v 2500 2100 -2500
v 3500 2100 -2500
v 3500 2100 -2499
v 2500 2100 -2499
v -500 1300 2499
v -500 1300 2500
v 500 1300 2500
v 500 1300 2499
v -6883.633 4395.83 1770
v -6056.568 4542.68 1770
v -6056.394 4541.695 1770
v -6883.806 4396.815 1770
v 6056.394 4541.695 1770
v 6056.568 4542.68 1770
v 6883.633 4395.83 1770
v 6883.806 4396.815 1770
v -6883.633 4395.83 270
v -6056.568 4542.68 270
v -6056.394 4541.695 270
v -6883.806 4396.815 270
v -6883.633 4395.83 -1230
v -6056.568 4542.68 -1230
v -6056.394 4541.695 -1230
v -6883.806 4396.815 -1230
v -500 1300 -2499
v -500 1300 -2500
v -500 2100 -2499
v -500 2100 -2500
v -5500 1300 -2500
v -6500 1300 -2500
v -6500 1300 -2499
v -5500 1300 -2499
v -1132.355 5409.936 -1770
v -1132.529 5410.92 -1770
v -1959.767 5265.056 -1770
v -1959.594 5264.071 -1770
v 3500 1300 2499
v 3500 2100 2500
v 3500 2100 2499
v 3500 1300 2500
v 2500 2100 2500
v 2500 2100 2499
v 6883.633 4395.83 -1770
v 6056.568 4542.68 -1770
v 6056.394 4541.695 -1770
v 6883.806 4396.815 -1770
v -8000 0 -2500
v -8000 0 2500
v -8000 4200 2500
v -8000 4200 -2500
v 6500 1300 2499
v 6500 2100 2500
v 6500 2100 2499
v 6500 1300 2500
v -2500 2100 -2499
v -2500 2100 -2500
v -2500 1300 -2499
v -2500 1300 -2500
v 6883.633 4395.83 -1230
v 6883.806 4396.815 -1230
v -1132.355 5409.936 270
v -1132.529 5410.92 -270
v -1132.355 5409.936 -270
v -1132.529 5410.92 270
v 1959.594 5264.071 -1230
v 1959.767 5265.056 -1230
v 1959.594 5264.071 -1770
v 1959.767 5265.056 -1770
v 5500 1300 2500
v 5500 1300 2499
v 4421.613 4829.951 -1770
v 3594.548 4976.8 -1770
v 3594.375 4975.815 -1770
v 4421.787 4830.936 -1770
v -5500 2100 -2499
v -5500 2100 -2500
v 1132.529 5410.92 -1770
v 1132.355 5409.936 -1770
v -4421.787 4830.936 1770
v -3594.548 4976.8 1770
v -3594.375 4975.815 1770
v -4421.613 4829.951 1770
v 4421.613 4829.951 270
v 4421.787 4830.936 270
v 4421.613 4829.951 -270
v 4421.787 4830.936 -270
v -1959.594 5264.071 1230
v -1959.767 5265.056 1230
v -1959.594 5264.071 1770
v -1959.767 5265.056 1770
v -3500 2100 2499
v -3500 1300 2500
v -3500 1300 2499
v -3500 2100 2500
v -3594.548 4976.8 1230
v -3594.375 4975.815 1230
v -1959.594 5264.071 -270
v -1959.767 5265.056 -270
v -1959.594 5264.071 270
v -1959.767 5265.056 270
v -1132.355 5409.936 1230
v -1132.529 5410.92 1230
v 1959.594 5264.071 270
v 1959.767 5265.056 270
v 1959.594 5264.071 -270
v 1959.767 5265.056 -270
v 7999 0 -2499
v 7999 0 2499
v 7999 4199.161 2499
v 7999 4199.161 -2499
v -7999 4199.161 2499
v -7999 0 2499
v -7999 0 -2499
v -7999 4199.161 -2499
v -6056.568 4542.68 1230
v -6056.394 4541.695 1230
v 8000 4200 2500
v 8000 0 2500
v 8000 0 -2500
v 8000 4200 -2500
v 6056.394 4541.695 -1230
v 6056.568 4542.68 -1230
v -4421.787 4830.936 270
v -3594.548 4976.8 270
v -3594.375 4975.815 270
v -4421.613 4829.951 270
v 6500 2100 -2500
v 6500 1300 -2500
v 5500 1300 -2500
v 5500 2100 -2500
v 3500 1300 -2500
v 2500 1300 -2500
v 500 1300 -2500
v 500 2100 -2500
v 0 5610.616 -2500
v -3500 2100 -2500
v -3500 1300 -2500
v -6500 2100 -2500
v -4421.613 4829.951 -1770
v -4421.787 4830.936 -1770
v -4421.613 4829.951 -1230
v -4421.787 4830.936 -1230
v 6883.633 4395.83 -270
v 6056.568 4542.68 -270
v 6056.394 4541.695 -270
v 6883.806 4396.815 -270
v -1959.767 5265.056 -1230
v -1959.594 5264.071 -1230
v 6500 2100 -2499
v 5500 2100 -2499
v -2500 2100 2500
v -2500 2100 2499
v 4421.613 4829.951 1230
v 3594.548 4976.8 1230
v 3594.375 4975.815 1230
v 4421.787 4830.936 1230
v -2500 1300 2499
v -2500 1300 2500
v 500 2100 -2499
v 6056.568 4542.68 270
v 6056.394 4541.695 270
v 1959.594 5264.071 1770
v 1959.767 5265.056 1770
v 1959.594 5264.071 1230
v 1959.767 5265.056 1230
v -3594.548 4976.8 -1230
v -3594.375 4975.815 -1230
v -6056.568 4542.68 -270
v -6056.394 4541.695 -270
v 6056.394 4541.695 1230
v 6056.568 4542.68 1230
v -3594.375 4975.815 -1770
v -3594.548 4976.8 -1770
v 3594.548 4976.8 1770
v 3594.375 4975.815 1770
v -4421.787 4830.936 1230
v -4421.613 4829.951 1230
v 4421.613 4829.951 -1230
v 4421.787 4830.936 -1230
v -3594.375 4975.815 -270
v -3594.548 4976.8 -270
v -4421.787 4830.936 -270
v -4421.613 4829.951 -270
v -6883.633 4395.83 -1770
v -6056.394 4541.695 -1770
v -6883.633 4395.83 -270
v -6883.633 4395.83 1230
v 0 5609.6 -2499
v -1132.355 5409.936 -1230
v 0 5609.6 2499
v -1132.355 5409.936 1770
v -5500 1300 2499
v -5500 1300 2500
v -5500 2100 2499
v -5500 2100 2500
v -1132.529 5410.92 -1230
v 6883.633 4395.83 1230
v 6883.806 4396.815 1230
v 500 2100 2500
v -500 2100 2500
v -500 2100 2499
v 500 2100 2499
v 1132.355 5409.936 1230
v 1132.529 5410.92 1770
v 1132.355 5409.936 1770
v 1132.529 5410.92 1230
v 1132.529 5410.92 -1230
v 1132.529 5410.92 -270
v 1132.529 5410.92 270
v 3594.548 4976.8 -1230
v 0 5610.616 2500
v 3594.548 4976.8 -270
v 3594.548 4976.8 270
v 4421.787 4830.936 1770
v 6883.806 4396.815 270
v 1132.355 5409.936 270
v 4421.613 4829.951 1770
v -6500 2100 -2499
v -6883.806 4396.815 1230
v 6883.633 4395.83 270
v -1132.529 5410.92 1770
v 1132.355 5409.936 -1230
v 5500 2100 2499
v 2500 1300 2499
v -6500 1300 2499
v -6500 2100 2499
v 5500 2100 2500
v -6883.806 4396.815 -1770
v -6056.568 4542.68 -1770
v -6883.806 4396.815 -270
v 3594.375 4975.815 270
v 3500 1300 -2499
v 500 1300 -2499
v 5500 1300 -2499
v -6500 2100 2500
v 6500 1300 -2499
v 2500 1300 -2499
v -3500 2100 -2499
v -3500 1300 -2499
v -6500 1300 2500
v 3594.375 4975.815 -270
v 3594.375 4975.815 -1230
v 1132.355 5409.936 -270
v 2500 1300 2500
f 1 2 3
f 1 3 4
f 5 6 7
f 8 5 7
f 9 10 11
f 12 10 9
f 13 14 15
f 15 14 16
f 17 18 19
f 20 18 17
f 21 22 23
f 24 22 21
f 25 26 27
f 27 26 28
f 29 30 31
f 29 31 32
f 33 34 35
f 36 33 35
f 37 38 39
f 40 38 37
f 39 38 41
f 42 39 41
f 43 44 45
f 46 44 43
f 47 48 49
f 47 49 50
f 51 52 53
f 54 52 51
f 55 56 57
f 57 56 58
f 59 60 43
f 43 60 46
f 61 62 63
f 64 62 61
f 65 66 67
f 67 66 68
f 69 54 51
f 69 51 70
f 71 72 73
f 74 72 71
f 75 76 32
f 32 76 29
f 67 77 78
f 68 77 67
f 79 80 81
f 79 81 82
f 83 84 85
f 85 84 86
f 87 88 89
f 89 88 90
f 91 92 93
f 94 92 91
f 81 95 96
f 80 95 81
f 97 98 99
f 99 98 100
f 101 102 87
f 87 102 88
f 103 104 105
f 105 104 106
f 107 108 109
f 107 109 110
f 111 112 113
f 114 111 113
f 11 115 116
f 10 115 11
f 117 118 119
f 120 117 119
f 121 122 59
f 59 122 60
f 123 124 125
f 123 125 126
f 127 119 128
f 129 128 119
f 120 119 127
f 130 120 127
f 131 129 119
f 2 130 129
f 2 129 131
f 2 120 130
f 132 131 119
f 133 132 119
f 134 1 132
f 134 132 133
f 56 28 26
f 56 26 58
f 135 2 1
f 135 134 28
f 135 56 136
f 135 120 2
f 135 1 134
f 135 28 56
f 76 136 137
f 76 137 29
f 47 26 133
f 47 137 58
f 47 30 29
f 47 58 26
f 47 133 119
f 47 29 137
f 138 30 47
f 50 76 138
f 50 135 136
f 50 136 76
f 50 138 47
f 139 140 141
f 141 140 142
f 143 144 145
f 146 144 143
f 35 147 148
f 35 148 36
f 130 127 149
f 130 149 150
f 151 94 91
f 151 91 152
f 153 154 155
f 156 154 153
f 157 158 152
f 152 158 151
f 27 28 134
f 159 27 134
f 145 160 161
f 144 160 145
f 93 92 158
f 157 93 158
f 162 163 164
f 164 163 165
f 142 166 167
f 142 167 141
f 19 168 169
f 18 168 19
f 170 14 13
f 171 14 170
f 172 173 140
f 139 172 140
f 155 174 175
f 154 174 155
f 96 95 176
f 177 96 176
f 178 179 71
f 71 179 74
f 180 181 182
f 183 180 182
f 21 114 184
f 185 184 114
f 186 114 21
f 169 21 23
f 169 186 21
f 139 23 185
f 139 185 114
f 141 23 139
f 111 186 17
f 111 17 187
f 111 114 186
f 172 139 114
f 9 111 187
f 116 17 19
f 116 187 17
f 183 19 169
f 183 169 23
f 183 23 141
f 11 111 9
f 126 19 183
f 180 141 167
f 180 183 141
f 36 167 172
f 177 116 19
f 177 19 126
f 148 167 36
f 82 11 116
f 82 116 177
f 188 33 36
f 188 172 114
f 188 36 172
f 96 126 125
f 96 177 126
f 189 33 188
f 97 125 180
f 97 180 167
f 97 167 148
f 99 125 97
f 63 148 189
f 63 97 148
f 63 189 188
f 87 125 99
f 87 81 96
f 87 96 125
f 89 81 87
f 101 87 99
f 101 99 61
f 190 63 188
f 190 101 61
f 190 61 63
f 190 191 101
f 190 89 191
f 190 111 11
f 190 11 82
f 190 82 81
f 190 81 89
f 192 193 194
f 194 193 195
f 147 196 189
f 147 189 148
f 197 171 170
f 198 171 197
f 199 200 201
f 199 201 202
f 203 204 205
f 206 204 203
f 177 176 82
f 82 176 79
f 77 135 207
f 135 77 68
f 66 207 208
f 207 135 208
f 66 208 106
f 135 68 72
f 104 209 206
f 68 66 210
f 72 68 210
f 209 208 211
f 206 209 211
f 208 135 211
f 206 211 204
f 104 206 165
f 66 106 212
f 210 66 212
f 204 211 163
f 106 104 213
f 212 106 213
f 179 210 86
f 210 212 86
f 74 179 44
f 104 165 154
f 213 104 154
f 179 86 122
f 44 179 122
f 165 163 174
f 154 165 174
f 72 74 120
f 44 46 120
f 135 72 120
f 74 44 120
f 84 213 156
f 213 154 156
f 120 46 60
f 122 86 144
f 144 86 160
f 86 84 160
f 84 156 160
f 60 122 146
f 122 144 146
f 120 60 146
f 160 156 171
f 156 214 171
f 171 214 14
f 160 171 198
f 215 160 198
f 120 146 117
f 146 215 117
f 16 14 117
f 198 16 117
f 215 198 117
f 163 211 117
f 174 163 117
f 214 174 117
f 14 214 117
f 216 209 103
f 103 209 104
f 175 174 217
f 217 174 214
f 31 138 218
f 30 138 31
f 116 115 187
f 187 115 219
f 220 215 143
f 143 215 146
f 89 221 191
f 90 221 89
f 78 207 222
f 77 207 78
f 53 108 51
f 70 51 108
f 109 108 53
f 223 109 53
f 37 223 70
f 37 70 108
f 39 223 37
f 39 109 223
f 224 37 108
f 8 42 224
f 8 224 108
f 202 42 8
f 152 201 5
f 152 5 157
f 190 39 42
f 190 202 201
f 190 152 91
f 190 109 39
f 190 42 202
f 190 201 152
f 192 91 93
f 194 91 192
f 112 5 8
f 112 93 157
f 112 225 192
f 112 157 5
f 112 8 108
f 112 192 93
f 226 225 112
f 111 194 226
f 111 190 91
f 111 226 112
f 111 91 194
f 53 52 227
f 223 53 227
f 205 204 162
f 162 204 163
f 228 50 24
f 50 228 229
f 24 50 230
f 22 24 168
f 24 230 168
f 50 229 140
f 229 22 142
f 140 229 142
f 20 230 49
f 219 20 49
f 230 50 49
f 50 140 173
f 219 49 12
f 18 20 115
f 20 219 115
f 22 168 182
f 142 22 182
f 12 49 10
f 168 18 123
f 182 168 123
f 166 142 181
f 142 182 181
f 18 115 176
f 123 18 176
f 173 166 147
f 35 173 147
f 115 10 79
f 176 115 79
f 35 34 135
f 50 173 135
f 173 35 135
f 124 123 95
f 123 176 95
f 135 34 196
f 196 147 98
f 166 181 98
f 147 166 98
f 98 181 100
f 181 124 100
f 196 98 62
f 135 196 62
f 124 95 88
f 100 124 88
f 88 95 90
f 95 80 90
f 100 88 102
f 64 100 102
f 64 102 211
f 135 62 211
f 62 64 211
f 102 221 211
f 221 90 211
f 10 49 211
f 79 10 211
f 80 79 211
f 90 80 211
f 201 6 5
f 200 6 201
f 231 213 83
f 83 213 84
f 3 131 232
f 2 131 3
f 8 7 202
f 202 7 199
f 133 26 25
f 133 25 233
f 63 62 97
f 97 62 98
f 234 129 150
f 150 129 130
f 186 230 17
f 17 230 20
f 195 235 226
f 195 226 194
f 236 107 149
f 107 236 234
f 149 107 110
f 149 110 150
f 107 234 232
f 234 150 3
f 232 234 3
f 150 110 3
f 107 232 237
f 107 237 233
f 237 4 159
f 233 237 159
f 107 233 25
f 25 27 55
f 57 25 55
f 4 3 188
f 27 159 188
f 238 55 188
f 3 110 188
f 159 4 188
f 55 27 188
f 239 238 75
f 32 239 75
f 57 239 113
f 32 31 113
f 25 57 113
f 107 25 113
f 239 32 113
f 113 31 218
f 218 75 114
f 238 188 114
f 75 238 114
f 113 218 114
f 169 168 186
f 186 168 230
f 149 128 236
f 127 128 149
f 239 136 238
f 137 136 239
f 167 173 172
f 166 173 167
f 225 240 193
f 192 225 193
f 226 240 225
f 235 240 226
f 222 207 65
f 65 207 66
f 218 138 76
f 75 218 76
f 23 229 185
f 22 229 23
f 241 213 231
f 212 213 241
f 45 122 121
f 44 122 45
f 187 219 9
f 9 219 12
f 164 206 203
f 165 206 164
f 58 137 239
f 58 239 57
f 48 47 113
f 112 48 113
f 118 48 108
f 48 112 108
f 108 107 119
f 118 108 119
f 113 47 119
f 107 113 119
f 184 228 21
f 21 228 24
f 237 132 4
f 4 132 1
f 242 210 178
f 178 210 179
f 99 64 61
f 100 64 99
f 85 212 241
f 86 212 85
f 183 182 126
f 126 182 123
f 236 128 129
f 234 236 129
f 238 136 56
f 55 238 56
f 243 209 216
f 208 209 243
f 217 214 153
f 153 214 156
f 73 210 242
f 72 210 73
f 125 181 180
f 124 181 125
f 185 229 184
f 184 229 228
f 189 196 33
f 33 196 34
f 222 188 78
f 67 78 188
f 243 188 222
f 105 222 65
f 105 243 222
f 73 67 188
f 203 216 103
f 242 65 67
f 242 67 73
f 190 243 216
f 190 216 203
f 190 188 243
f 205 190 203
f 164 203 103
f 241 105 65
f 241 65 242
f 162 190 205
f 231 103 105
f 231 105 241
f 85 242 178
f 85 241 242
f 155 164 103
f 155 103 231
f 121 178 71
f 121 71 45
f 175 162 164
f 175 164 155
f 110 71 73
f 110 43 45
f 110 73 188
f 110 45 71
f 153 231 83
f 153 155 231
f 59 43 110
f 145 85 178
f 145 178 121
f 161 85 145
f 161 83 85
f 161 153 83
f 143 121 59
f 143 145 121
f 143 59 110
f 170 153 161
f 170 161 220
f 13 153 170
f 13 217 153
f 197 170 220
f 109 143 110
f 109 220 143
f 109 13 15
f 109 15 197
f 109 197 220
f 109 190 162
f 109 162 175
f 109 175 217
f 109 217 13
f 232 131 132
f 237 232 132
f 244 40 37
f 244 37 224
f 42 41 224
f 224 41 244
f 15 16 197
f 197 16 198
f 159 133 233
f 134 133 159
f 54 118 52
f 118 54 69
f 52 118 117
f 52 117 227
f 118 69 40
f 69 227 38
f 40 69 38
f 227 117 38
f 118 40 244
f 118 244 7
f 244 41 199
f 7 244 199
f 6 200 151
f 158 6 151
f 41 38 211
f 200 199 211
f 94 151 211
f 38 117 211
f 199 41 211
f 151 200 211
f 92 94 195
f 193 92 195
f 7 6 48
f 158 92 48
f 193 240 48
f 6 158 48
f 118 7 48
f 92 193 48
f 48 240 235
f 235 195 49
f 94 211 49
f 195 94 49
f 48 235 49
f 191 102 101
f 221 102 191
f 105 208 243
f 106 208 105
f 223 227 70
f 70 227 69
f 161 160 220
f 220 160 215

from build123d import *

# Parameters (mm, degrees)
SKETCH2_W               = 16000
SKETCH2_H               = 5000
BOSS_EXTRUDE1_DEPTH     = 4200
BOSS_EXTRUDE2_DEPTH     = 2500
SHELL1_T                = -1
CUT_EXTRUDE1_REACH      = 10978.293
SKETCH4_W               = 1000
SKETCH4_H               = 800
LPATTERN1_COUNT         = 3
LPATTERN1_PITCH         = 3000
MIRROR1_COPY_1_REACH    = 10978.293
MIRROR1_COPY_1_SKETCH_W = 1000
MIRROR1_COPY_1_SKETCH_H = 800
MIRROR1_COPY_2_REACH    = 10978.293
MIRROR1_COPY_2_SKETCH_W = 1000
MIRROR1_COPY_2_SKETCH_H = 800
MIRROR4_COPY_1_REACH    = 10978.293
MIRROR4_COPY_1_SKETCH_W = 1000
MIRROR4_COPY_1_SKETCH_H = 800
MIRROR4_COPY_2_REACH    = 10978.293
MIRROR4_COPY_2_SKETCH_W = 1000
MIRROR4_COPY_2_SKETCH_H = 800
MIRROR4_COPY_3_REACH    = 10978.293
MIRROR4_COPY_3_SKETCH_W = 1000
MIRROR4_COPY_3_SKETCH_H = 800
MIRROR4_COPY_4_REACH    = 10978.293
MIRROR4_COPY_4_SKETCH_W = 1000
MIRROR4_COPY_4_SKETCH_H = 800
SKETCH5_W               = 840
SKETCH5_H               = 540
CUT_EXTRUDE2_DEPTH      = 1
LPATTERN2_COUNT         = 3
LPATTERN2_PITCH         = 1500
LPATTERN2_COUNT_DIR2    = 3
LPATTERN2_PITCH_DIR2    = 2500
MIRROR9_COPY_1_SKETCH_W = 840
MIRROR9_COPY_1_SKETCH_H = 540
MIRROR9_COPY_1_DEPTH    = 1
MIRROR9_COPY_2_SKETCH_W = 840
MIRROR9_COPY_2_SKETCH_H = 540
MIRROR9_COPY_2_DEPTH    = 1
MIRROR9_COPY_3_SKETCH_W = 840
MIRROR9_COPY_3_SKETCH_H = 540
MIRROR9_COPY_3_DEPTH    = 1
MIRROR9_COPY_4_SKETCH_W = 840
MIRROR9_COPY_4_SKETCH_H = 540
MIRROR9_COPY_4_DEPTH    = 1
MIRROR9_COPY_5_SKETCH_W = 840
MIRROR9_COPY_5_SKETCH_H = 540
MIRROR9_COPY_5_DEPTH    = 1
MIRROR9_COPY_6_SKETCH_W = 840
MIRROR9_COPY_6_SKETCH_H = 540
MIRROR9_COPY_6_DEPTH    = 1
MIRROR9_COPY_7_SKETCH_W = 840
MIRROR9_COPY_7_SKETCH_H = 540
MIRROR9_COPY_7_DEPTH    = 1
MIRROR9_COPY_8_SKETCH_W = 840
MIRROR9_COPY_8_SKETCH_H = 540
MIRROR9_COPY_8_DEPTH    = 1


with BuildPart() as part:
    # Sketch2 → Boss-Extrude1 (new body)
    with BuildSketch(Plane(origin=(0, 0, 0), x_dir=(1, 0, 0), z_dir=(0, 1, 0))):
        Rectangle(SKETCH2_W, SKETCH2_H)
    extrude(amount=BOSS_EXTRUDE1_DEPTH)

    # Sketch3 → Boss-Extrude2 (add, symmetric)
    with BuildSketch(Plane.XY):
        Polygon((-8000, 4200), (0, 5610.615845668), (8000, 4200), align=None)
    extrude(amount=BOSS_EXTRUDE2_DEPTH, both=True)

    # Shell1
    shell1_openings = [part.faces().sort_by_distance(p)[0] for p in [
        (0, 0, 0),
    ]]
    offset(amount=SHELL1_T, openings=shell1_openings, kind=Kind.INTERSECTION)

    # Sketch4 → Cut-Extrude1 (cut, up to next)
    with BuildSketch(Plane.XY.offset(2500), mode=Mode.PRIVATE) as cut_extrude1_sk1:
        with Locations((0, 1700)):
            Rectangle(SKETCH4_W, SKETCH4_H)
    cut_extrude1_tool1 = extrude(cut_extrude1_sk1.sketch, amount=-CUT_EXTRUDE1_REACH, mode=Mode.PRIVATE) & part.part
    cut_extrude1 = cut_extrude1_tool1.solids().sort_by_distance((0, 1700, 2500))[0]
    add(cut_extrude1, mode=Mode.SUBTRACT)

    # LPattern1: Cut-Extrude1 ×3
    with Locations(*[(-i * LPATTERN1_PITCH, 0, 0) for i in range(1, LPATTERN1_COUNT)]):
        add(cut_extrude1, mode=Mode.SUBTRACT)

    # Mirror1 copy 1 sketch → Mirror1 copy 1 (cut, up to next)
    with BuildSketch(Plane(origin=(3000, 0, 2500), x_dir=(-1, 0, 0), z_dir=(0, 0, 1)), mode=Mode.PRIVATE) as mirror1_copy_1_sk1:
        with Locations((0, -1700)):
            Rectangle(MIRROR1_COPY_1_SKETCH_W, MIRROR1_COPY_1_SKETCH_H)
    mirror1_copy_1_tool1 = extrude(mirror1_copy_1_sk1.sketch, amount=-MIRROR1_COPY_1_REACH, mode=Mode.PRIVATE) & part.part
    add(mirror1_copy_1_tool1.solids().sort_by_distance((3000, 1700, 2500))[0], mode=Mode.SUBTRACT)

    # Mirror1 copy 2 sketch → Mirror1 copy 2 (cut, up to next)
    with BuildSketch(Plane(origin=(6000, 0, 2500), x_dir=(-1, 0, 0), z_dir=(0, 0, 1)), mode=Mode.PRIVATE) as mirror1_copy_2_sk1:
        with Locations((0, -1700)):
            Rectangle(MIRROR1_COPY_2_SKETCH_W, MIRROR1_COPY_2_SKETCH_H)
    mirror1_copy_2_tool1 = extrude(mirror1_copy_2_sk1.sketch, amount=-MIRROR1_COPY_2_REACH, mode=Mode.PRIVATE) & part.part
    add(mirror1_copy_2_tool1.solids().sort_by_distance((6000, 1700, 2500))[0], mode=Mode.SUBTRACT)

    # Mirror4: Cut-Extrude1 across plane
    add(cut_extrude1.mirror(Plane.XY), mode=Mode.SUBTRACT)

    # Mirror4 copy 1 sketch → Mirror4 copy 1 (cut, up to next)
    with BuildSketch(Plane(origin=(-3000, 0, -2500), x_dir=(1, 0, 0), z_dir=(0, 0, -1)), mode=Mode.PRIVATE) as mirror4_copy_1_sk1:
        with Locations((0, -1700)):
            Rectangle(MIRROR4_COPY_1_SKETCH_W, MIRROR4_COPY_1_SKETCH_H)
    mirror4_copy_1_tool1 = extrude(mirror4_copy_1_sk1.sketch, amount=-MIRROR4_COPY_1_REACH, mode=Mode.PRIVATE) & part.part
    add(mirror4_copy_1_tool1.solids().sort_by_distance((-3000, 1700, -2500))[0], mode=Mode.SUBTRACT)

    # Mirror4 copy 2 sketch → Mirror4 copy 2 (cut, up to next)
    with BuildSketch(Plane(origin=(-6000, 0, -2500), x_dir=(1, 0, 0), z_dir=(0, 0, -1)), mode=Mode.PRIVATE) as mirror4_copy_2_sk1:
        with Locations((0, -1700)):
            Rectangle(MIRROR4_COPY_2_SKETCH_W, MIRROR4_COPY_2_SKETCH_H)
    mirror4_copy_2_tool1 = extrude(mirror4_copy_2_sk1.sketch, amount=-MIRROR4_COPY_2_REACH, mode=Mode.PRIVATE) & part.part
    add(mirror4_copy_2_tool1.solids().sort_by_distance((-6000, 1700, -2500))[0], mode=Mode.SUBTRACT)

    # Mirror4 copy 3 sketch → Mirror4 copy 3 (cut, up to next)
    with BuildSketch(Plane(origin=(3000, 0, -2500), x_dir=(-1, 0, 0), z_dir=(0, 0, -1)), mode=Mode.PRIVATE) as mirror4_copy_3_sk1:
        with Locations((0, 1700)):
            Rectangle(MIRROR4_COPY_3_SKETCH_W, MIRROR4_COPY_3_SKETCH_H)
    mirror4_copy_3_tool1 = extrude(mirror4_copy_3_sk1.sketch, amount=-MIRROR4_COPY_3_REACH, mode=Mode.PRIVATE) & part.part
    add(mirror4_copy_3_tool1.solids().sort_by_distance((3000, 1700, -2500))[0], mode=Mode.SUBTRACT)

    # Mirror4 copy 4 sketch → Mirror4 copy 4 (cut, up to next)
    with BuildSketch(Plane(origin=(6000, 0, -2500), x_dir=(-1, 0, 0), z_dir=(0, 0, -1)), mode=Mode.PRIVATE) as mirror4_copy_4_sk1:
        with Locations((0, 1700)):
            Rectangle(MIRROR4_COPY_4_SKETCH_W, MIRROR4_COPY_4_SKETCH_H)
    mirror4_copy_4_tool1 = extrude(mirror4_copy_4_sk1.sketch, amount=-MIRROR4_COPY_4_REACH, mode=Mode.PRIVATE) & part.part
    add(mirror4_copy_4_tool1.solids().sort_by_distance((6000, 1700, -2500))[0], mode=Mode.SUBTRACT)

    # Sketch5 → Cut-Extrude2 (cut)
    with BuildSketch(Plane(origin=(959.47181784, 5441.435076953, 0), x_dir=(0.9848077530122079, -0.17364817766693114, 0), z_dir=(0.17364817766693114, 0.9848077530122079, 0))):
        with Locations((595.726782811, 1500)):
            Rectangle(SKETCH5_W, SKETCH5_H)
    cut_extrude2 = extrude(amount=-CUT_EXTRUDE2_DEPTH, mode=Mode.SUBTRACT)

    # LPattern2: Cut-Extrude2 3 × 3
    with Locations(*[Vector(0, 0, 1) * (i * LPATTERN2_PITCH) + Vector(0.9848077530122079, -0.17364817766693114, 0) * (j * LPATTERN2_PITCH_DIR2) for i in range(LPATTERN2_COUNT) for j in range(LPATTERN2_COUNT_DIR2) if (i, j) != (0, 0)]):
        add(cut_extrude2, mode=Mode.SUBTRACT)

    # Mirror9: Cut-Extrude2 across plane
    add(cut_extrude2.mirror(Plane(origin=(0, 0, 0), x_dir=(0, 0, 1), z_dir=(1, 0, 0))), mode=Mode.SUBTRACT)

    # Mirror9 copy 1 sketch → Mirror9 copy 1 (cut)
    with BuildSketch(Plane(origin=(-3421.491200371, 5007.314632786, 0), x_dir=(-0.9848077530122079, -0.17364817766693114, 0), z_dir=(-0.17364817766693114, 0.9848077530122079, 0))):
        with Locations((595.726782811, -1500)):
            Rectangle(MIRROR9_COPY_1_SKETCH_W, MIRROR9_COPY_1_SKETCH_H)
    extrude(amount=-MIRROR9_COPY_1_DEPTH, mode=Mode.SUBTRACT)

    # Mirror9 copy 2 sketch → Mirror9 copy 2 (cut)
    with BuildSketch(Plane(origin=(-5883.510582901, 4573.194188618, 0), x_dir=(-0.9848077530122079, -0.17364817766693114, 0), z_dir=(-0.17364817766693114, 0.9848077530122079, 0))):
        with Locations((595.726782811, -1500)):
            Rectangle(MIRROR9_COPY_2_SKETCH_W, MIRROR9_COPY_2_SKETCH_H)
    extrude(amount=-MIRROR9_COPY_2_DEPTH, mode=Mode.SUBTRACT)

    # Mirror9 copy 3 sketch → Mirror9 copy 3 (cut)
    with BuildSketch(Plane(origin=(-959.47181784, 5441.435076953, 1500), x_dir=(-0.9848077530122079, -0.17364817766693114, 0), z_dir=(-0.17364817766693114, 0.9848077530122079, 0))):
        with Locations((595.726782811, -1500)):
            Rectangle(MIRROR9_COPY_3_SKETCH_W, MIRROR9_COPY_3_SKETCH_H)
    extrude(amount=-MIRROR9_COPY_3_DEPTH, mode=Mode.SUBTRACT)

    # Mirror9 copy 4 sketch → Mirror9 copy 4 (cut)
    with BuildSketch(Plane(origin=(-3421.491200371, 5007.314632786, 1500), x_dir=(-0.9848077530122079, -0.17364817766693114, 0), z_dir=(-0.17364817766693114, 0.9848077530122079, 0))):
        with Locations((595.726782811, -1500)):
            Rectangle(MIRROR9_COPY_4_SKETCH_W, MIRROR9_COPY_4_SKETCH_H)
    extrude(amount=-MIRROR9_COPY_4_DEPTH, mode=Mode.SUBTRACT)

    # Mirror9 copy 5 sketch → Mirror9 copy 5 (cut)
    with BuildSketch(Plane(origin=(-5883.510582901, 4573.194188618, 1500), x_dir=(-0.9848077530122079, -0.17364817766693114, 0), z_dir=(-0.17364817766693114, 0.9848077530122079, 0))):
        with Locations((595.726782811, -1500)):
            Rectangle(MIRROR9_COPY_5_SKETCH_W, MIRROR9_COPY_5_SKETCH_H)
    extrude(amount=-MIRROR9_COPY_5_DEPTH, mode=Mode.SUBTRACT)

    # Mirror9 copy 6 sketch → Mirror9 copy 6 (cut)
    with BuildSketch(Plane(origin=(-959.47181784, 5441.435076953, 3000), x_dir=(-0.9848077530122079, -0.17364817766693114, 0), z_dir=(-0.17364817766693114, 0.9848077530122079, 0))):
        with Locations((595.726782811, -1500)):
            Rectangle(MIRROR9_COPY_6_SKETCH_W, MIRROR9_COPY_6_SKETCH_H)
    extrude(amount=-MIRROR9_COPY_6_DEPTH, mode=Mode.SUBTRACT)

    # Mirror9 copy 7 sketch → Mirror9 copy 7 (cut)
    with BuildSketch(Plane(origin=(-3421.491200371, 5007.314632786, 3000), x_dir=(-0.9848077530122079, -0.17364817766693114, 0), z_dir=(-0.17364817766693114, 0.9848077530122079, 0))):
        with Locations((595.726782811, -1500)):
            Rectangle(MIRROR9_COPY_7_SKETCH_W, MIRROR9_COPY_7_SKETCH_H)
    extrude(amount=-MIRROR9_COPY_7_DEPTH, mode=Mode.SUBTRACT)

    # Mirror9 copy 8 sketch → Mirror9 copy 8 (cut)
    with BuildSketch(Plane(origin=(-5883.510582901, 4573.194188618, 3000), x_dir=(-0.9848077530122079, -0.17364817766693114, 0), z_dir=(-0.17364817766693114, 0.9848077530122079, 0))):
        with Locations((595.726782811, -1500)):
            Rectangle(MIRROR9_COPY_8_SKETCH_W, MIRROR9_COPY_8_SKETCH_H)
    extrude(amount=-MIRROR9_COPY_8_DEPTH, mode=Mode.SUBTRACT)


solid = part.part
